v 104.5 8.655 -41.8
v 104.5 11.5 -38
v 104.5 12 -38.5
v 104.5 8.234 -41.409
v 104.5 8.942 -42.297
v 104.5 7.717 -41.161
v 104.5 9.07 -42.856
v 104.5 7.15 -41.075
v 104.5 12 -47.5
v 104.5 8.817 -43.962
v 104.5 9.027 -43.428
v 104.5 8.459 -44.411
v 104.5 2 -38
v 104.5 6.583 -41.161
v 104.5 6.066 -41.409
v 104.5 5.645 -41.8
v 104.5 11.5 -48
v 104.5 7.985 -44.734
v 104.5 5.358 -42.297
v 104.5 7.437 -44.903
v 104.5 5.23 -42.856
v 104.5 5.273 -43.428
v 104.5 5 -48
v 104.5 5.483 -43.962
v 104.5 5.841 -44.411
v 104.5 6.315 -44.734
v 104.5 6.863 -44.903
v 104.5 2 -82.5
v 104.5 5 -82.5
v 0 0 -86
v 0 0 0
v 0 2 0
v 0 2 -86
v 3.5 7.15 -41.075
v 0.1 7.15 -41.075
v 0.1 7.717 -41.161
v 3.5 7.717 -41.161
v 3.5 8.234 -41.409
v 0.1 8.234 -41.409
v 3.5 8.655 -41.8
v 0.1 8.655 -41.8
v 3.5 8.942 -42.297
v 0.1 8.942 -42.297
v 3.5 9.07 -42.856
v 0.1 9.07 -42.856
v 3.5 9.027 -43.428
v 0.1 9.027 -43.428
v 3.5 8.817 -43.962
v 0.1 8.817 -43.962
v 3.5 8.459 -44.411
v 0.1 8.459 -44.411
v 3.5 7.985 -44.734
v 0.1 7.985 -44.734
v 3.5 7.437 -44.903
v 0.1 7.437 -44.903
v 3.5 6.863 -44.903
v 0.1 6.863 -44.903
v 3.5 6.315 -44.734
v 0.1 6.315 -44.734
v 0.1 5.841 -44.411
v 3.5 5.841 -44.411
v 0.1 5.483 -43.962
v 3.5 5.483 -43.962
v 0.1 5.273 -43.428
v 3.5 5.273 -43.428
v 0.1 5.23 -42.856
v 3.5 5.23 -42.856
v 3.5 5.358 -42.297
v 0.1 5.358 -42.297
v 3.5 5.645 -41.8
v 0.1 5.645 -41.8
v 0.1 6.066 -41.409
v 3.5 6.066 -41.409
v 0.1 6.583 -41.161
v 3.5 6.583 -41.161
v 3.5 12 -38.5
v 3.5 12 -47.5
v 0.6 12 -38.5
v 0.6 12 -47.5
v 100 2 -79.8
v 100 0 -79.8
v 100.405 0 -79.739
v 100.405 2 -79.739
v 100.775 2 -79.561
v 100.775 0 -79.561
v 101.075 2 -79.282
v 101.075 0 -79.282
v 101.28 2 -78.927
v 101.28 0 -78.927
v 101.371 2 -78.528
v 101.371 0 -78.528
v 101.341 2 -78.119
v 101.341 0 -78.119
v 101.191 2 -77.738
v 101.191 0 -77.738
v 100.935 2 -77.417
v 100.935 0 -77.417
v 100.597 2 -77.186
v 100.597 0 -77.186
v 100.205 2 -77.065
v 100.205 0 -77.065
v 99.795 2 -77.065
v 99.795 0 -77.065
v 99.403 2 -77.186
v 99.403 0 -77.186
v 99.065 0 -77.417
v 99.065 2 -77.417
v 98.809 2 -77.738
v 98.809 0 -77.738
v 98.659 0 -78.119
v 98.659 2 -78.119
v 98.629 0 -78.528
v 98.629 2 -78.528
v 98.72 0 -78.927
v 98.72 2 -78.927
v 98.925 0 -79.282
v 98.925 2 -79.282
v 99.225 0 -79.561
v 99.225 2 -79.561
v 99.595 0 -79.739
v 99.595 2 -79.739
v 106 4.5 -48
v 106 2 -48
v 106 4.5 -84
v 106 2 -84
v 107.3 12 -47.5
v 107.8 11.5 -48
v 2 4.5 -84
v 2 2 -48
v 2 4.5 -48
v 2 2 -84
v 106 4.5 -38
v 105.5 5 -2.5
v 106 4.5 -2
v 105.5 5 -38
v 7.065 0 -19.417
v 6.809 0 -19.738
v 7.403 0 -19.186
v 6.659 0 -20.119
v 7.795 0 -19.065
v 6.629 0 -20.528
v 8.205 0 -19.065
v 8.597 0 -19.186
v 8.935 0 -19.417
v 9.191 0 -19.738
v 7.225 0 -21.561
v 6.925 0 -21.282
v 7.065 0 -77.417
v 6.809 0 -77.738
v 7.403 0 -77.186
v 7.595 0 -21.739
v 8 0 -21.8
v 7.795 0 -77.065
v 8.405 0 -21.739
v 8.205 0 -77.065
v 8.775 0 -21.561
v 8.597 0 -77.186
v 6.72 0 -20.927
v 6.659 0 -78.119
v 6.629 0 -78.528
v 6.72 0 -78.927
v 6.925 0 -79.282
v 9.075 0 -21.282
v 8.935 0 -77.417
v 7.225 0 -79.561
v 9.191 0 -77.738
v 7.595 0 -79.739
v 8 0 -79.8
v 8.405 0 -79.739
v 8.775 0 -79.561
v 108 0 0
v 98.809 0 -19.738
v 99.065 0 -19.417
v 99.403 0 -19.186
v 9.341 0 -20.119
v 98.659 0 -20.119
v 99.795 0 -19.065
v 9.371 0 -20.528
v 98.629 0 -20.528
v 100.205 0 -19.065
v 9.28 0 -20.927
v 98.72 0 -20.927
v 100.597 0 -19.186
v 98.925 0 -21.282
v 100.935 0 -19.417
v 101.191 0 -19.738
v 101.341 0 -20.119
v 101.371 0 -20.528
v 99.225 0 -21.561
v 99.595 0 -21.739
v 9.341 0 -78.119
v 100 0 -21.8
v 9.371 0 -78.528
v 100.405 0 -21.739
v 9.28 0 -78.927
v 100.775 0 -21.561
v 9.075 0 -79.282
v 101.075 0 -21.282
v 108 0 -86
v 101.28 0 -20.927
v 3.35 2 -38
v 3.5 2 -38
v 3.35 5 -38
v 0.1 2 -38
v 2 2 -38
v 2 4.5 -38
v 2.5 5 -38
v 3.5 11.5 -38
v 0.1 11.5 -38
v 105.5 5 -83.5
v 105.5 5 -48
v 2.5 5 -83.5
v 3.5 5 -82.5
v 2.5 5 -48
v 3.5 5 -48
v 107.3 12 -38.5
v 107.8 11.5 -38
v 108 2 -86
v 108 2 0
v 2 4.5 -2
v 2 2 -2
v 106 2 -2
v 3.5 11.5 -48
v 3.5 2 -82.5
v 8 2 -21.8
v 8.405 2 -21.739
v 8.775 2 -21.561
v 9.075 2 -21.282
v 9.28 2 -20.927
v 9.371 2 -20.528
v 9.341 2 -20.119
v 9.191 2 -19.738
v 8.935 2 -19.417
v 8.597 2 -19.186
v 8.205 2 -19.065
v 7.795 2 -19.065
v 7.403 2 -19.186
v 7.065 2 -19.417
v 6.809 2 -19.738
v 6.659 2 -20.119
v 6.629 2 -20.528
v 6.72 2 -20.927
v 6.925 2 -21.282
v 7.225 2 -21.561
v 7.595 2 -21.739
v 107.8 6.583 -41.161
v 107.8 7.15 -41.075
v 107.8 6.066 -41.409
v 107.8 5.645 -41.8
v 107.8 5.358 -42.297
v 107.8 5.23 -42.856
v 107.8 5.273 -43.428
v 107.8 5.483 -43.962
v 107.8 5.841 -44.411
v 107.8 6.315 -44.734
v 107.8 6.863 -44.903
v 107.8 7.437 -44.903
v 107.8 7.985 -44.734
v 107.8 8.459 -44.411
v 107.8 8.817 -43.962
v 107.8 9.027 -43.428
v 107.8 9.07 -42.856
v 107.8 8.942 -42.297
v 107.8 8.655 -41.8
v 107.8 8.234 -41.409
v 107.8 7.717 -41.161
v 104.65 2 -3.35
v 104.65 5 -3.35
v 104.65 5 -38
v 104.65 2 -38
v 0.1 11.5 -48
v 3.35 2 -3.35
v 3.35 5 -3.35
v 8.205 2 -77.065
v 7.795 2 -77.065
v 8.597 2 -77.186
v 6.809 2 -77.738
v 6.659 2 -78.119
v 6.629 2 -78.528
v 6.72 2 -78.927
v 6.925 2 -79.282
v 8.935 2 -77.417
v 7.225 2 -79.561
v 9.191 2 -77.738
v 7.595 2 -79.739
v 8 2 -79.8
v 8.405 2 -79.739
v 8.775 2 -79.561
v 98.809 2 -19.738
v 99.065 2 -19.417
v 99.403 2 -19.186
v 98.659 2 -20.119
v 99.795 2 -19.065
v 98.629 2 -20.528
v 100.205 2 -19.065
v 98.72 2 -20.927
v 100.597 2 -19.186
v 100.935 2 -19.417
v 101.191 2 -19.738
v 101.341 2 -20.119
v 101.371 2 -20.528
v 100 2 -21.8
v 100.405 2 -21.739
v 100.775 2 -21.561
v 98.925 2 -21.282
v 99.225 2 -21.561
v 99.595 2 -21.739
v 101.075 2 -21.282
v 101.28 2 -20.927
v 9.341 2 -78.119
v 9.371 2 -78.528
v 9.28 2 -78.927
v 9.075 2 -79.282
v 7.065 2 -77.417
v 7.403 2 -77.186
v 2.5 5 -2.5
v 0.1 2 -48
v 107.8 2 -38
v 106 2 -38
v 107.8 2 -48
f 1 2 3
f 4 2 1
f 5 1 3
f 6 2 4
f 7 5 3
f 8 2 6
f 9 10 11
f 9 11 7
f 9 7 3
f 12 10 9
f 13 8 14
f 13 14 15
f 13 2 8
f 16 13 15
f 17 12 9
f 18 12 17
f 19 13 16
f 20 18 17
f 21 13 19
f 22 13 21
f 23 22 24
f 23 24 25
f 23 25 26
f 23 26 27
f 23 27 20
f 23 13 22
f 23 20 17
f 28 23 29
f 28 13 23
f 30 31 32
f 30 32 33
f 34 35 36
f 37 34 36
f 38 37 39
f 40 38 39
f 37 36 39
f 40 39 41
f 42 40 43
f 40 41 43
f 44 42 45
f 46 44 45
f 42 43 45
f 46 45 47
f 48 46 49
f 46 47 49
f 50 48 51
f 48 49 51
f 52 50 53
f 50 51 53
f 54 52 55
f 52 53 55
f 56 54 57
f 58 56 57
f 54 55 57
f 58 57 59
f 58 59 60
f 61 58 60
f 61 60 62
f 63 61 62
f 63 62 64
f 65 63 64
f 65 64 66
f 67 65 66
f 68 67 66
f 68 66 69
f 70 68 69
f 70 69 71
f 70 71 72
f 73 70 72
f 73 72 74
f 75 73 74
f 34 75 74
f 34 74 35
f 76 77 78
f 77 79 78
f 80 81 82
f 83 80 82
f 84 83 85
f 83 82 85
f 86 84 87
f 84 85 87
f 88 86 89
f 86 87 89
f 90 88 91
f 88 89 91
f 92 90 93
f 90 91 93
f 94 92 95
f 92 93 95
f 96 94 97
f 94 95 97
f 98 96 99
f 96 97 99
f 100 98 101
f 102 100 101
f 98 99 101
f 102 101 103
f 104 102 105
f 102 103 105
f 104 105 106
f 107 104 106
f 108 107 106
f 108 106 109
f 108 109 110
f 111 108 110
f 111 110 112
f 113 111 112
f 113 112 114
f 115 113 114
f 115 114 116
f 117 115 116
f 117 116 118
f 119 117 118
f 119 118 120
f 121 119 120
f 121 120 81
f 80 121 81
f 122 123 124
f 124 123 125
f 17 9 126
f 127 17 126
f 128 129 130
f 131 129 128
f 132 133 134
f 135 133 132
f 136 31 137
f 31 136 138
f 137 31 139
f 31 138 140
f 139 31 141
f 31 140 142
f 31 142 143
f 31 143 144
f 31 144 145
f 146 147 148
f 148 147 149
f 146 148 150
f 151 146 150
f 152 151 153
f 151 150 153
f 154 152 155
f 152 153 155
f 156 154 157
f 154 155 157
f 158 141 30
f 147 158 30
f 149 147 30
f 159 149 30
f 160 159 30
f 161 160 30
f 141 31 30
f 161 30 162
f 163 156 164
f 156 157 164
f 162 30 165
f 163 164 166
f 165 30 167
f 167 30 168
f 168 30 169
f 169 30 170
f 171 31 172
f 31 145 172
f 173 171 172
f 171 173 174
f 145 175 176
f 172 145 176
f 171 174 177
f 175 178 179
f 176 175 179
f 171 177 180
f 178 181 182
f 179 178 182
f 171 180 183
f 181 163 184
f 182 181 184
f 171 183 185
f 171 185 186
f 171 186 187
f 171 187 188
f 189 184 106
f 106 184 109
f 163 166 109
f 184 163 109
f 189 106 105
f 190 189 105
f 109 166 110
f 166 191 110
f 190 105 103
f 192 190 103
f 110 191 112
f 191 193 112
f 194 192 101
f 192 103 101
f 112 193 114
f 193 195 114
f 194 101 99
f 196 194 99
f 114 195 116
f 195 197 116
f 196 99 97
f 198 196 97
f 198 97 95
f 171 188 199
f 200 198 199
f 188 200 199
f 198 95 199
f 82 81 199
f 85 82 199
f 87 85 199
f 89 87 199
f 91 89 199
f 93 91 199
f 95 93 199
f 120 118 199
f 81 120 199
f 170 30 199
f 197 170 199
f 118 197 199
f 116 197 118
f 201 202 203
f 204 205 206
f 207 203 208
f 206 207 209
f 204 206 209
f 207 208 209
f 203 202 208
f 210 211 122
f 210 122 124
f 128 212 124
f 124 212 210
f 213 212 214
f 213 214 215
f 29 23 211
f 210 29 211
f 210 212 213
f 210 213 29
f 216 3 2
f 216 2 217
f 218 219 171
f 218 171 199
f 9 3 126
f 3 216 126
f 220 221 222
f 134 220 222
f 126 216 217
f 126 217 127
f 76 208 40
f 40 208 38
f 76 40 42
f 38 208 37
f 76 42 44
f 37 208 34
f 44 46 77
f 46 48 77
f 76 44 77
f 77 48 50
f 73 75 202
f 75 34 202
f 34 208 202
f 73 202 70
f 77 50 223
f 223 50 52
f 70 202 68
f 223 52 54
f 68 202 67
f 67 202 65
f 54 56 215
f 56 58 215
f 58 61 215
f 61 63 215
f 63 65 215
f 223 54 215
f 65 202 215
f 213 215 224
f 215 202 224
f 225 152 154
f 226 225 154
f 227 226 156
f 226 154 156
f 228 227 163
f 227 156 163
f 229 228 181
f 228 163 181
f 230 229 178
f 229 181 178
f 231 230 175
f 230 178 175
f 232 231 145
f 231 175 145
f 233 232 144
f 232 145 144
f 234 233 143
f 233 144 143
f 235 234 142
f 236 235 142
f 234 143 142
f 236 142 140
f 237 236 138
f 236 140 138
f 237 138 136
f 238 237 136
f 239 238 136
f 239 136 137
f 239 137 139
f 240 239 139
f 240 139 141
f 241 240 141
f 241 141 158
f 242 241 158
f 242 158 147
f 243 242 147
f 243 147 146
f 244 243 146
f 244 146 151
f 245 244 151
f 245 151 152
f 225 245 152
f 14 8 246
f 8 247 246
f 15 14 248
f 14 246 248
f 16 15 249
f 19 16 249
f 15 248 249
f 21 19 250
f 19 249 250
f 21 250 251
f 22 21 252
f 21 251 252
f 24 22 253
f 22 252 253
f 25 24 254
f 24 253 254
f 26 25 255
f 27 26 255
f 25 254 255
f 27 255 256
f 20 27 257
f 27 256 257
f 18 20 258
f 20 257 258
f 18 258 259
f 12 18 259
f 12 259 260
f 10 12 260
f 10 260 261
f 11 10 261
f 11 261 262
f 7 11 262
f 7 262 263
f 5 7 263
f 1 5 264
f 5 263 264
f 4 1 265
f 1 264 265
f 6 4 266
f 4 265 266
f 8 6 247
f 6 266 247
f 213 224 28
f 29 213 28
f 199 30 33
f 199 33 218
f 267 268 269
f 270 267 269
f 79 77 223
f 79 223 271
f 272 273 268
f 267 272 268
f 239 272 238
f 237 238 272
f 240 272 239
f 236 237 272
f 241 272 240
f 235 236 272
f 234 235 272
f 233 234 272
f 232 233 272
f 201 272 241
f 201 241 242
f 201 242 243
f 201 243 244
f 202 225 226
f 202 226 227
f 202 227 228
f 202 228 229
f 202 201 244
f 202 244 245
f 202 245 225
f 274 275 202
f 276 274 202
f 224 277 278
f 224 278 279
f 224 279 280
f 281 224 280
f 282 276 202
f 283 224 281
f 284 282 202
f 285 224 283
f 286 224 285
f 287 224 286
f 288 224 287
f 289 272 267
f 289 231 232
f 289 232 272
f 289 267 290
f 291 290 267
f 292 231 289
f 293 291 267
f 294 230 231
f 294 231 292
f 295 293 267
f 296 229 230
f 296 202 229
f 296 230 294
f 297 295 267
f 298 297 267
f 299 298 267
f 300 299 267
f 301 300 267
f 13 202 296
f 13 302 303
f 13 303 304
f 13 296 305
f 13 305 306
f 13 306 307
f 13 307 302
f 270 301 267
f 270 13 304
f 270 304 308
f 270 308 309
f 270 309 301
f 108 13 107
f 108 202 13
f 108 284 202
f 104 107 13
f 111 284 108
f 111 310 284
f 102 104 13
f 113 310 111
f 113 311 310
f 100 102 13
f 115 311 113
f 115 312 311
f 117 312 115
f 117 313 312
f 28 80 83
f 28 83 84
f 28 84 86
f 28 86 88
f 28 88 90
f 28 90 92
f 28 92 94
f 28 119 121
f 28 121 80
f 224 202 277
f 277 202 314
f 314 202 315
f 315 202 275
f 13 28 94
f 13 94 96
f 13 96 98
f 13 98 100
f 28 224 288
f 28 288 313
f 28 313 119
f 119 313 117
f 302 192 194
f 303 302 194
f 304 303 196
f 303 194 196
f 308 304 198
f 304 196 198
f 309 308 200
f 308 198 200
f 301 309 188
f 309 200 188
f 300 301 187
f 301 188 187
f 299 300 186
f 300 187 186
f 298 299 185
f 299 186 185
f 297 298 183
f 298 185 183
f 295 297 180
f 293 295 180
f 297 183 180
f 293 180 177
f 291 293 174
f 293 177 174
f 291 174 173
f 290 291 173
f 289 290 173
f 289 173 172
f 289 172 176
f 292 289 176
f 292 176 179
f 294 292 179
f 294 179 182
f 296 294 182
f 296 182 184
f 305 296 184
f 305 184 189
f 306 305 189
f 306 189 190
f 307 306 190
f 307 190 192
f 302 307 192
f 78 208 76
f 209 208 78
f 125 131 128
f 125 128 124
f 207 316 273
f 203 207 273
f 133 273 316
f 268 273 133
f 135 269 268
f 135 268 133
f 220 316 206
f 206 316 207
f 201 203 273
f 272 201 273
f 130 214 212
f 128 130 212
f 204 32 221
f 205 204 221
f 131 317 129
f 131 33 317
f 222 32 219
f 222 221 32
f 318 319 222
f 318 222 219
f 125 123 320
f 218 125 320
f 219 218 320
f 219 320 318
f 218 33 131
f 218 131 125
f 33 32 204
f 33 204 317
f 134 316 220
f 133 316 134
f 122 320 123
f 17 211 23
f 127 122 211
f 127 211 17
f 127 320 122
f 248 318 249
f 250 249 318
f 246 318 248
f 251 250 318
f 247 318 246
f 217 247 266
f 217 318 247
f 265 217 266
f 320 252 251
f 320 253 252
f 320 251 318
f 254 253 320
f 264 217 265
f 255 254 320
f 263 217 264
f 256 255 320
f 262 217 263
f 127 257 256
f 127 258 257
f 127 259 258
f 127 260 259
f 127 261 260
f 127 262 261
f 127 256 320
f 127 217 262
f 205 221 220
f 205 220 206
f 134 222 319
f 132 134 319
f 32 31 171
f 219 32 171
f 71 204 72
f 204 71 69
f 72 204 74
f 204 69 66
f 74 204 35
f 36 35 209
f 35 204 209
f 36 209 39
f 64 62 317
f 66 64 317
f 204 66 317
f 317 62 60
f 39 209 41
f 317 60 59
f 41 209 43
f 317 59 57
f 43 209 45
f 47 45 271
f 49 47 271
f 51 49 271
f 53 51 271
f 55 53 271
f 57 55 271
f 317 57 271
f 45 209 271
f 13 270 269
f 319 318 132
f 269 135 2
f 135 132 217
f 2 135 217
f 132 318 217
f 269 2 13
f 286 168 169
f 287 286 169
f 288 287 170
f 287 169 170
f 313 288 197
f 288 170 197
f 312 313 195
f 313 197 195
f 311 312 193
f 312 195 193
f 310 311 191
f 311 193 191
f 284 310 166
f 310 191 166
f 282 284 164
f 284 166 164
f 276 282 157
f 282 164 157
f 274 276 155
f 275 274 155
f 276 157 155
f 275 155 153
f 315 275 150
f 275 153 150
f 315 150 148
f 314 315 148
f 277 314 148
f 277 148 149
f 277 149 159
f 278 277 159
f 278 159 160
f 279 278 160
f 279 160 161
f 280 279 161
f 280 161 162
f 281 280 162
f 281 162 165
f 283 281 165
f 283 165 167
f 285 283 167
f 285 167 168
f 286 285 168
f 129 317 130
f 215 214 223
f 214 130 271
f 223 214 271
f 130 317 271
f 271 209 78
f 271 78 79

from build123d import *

# Parameters (mm, degrees)
SKETCH1_W                       = 108
SKETCH1_H                       = 86
BOSS_EXTRUDE1_DEPTH             = 2
SKETCH2_W                       = 104
SKETCH2_H                       = 82
SKETCH2_W_2                     = 101
SKETCH2_H_2                     = 79
BOSS_EXTRUDE2_DEPTH             = 3
BOSS_EXTRUDE4_REACH             = 138.591
SKETCH5_W                       = 10
SKETCH5_H                       = 10
BOSS_EXTRUDE4_DIRECTION_2_REACH = 138.591
BOSS_EXTRUDE5_REACH             = 139.026
SKETCH6_W                       = 10
SKETCH6_H                       = 10
BOSS_EXTRUDE5_DIRECTION_2_REACH = 139.026
SKETCH11_W                      = 0.1
SKETCH11_H                      = 10
SKETCH11_W_2                    = 0.2
CUT_EXTRUDE2_DEPTH              = 10
CHAMFER1_SIZE                   = 0.5
CHAMFER2_SIZE                   = 0.5
CUT_EXTRUDE3_REACH              = 140.578
SKETCH12_R                      = 1.375
CUT_EXTRUDE5_DEPTH              = 3
CUT_EXTRUDE6_REACH              = 140.501
SKETCH14_R                      = 1.925
CUT_EXTRUDE7_REACH              = 140.423
SKETCH15_R                      = 1.925


with BuildPart() as part:
    # Sketch1 → Boss-Extrude1 (new body)
    with BuildSketch(Plane(origin=(0, 0, 0), x_dir=(1, 0, 0), z_dir=(0, 1, 0))):
        with Locations((54, 43)):
            Rectangle(SKETCH1_W, SKETCH1_H)
    extrude(amount=BOSS_EXTRUDE1_DEPTH)

    # Sketch2 → Boss-Extrude2 (add)
    with BuildSketch(Plane(origin=(0, 2, 0), x_dir=(1, 0, 0), z_dir=(0, 1, 0))):
        with Locations((54, 43)):
            Rectangle(SKETCH2_W, SKETCH2_H)
        with Locations((54, 43)):
            Rectangle(SKETCH2_W_2, SKETCH2_H_2, mode=Mode.SUBTRACT)
    extrude(amount=BOSS_EXTRUDE2_DEPTH)

    # Boss-Extrude4: up to this face of the body (flat: up to its plane)
    boss_extrude4_end = Plane(part.part.faces().sort_by_distance((0, 1, -43))[0])
    # Sketch5 → Boss-Extrude4 (add, up to the picked face)
    with BuildSketch(Plane.ZY.offset(-2), mode=Mode.PRIVATE) as boss_extrude4_sk1:
        with Locations((-43, 7)):
            Rectangle(SKETCH5_W, SKETCH5_H)
    boss_extrude4_tool1 = split(extrude(boss_extrude4_sk1.sketch, amount=BOSS_EXTRUDE4_REACH, mode=Mode.PRIVATE), bisect_by=boss_extrude4_end, keep=Keep.BOTH, mode=Mode.PRIVATE)
    add(boss_extrude4_tool1.solids().sort_by(Axis((2, 7, -43), (-1, 0, 0)))[0])

    # Boss-Extrude4 direction 2: up to this face of the body (flat: up to its plane)
    boss_extrude4_direction_2_end = Plane(part.part.faces().sort_by_distance((3.5, 3.5, -43))[0])
    # Sketch5 → Boss-Extrude4 direction 2 (add, up to the picked face)
    with BuildSketch(Plane.ZY.offset(-2), mode=Mode.PRIVATE) as boss_extrude4_direction_2_sk1:
        with Locations((-43, 7)):
            Rectangle(SKETCH5_W, SKETCH5_H)
    boss_extrude4_direction_2_tool1 = split(extrude(boss_extrude4_direction_2_sk1.sketch, amount=-BOSS_EXTRUDE4_DIRECTION_2_REACH, mode=Mode.PRIVATE), bisect_by=boss_extrude4_direction_2_end, keep=Keep.BOTH, mode=Mode.PRIVATE)
    add(boss_extrude4_direction_2_tool1.solids().sort_by(Axis((2, 7, -43), (1, 0, 0)))[0])

    # Boss-Extrude5: up to this face of the body (flat: up to its plane)
    boss_extrude5_end = Plane(part.part.faces().sort_by_distance((108, 1, -43))[0])
    # Sketch6 → Boss-Extrude5 (add, up to the picked face)
    with BuildSketch(Plane(origin=(106, 0, 0), x_dir=(0, 0, -1), z_dir=(1, 0, 0)), mode=Mode.PRIVATE) as boss_extrude5_sk1:
        with Locations((43, 7)):
            Rectangle(SKETCH6_W, SKETCH6_H)
    boss_extrude5_tool1 = split(extrude(boss_extrude5_sk1.sketch, amount=BOSS_EXTRUDE5_REACH, mode=Mode.PRIVATE), bisect_by=boss_extrude5_end, keep=Keep.BOTH, mode=Mode.PRIVATE)
    add(boss_extrude5_tool1.solids().sort_by(Axis((106, 7, -43), (1, 0, 0)))[0])

    # Boss-Extrude5 direction 2: up to this face of the body (flat: up to its plane)
    boss_extrude5_direction_2_end = Plane(part.part.faces().sort_by_distance((104.5, 3.5, -43))[0])
    # Sketch6 → Boss-Extrude5 direction 2 (add, up to the picked face)
    with BuildSketch(Plane(origin=(106, 0, 0), x_dir=(0, 0, -1), z_dir=(1, 0, 0)), mode=Mode.PRIVATE) as boss_extrude5_direction_2_sk1:
        with Locations((43, 7)):
            Rectangle(SKETCH6_W, SKETCH6_H)
    boss_extrude5_direction_2_tool1 = split(extrude(boss_extrude5_direction_2_sk1.sketch, amount=-BOSS_EXTRUDE5_DIRECTION_2_REACH, mode=Mode.PRIVATE), bisect_by=boss_extrude5_direction_2_end, keep=Keep.BOTH, mode=Mode.PRIVATE)
    add(boss_extrude5_direction_2_tool1.solids().sort_by(Axis((106, 7, -43), (-1, 0, 0)))[0])

    # Sketch11 → Cut-Extrude2 (cut)
    with BuildSketch(Plane(origin=(0, 12, 0), x_dir=(1, 0, 0), z_dir=(0, 1, 0))):
        with Locations((0.05, 43)):
            Rectangle(SKETCH11_W, SKETCH11_H)
        with Locations((107.9, 43)):
            Rectangle(SKETCH11_W_2, SKETCH11_H)
    extrude(amount=-CUT_EXTRUDE2_DEPTH, mode=Mode.SUBTRACT)

    # Chamfer1
    chamfer1_edges = [part.edges().sort_by_distance(p)[0] for p in [
        (54, 5, -84),
        (2, 5, -66),
        (54, 5, -2),
        (106, 5, -20),
        (2, 5, -20),
        (106, 5, -66),
    ]]
    chamfer(chamfer1_edges, length=CHAMFER1_SIZE)

    # Chamfer2
    chamfer2_edges = [part.edges().sort_by_distance(p)[0] for p in [
        (106.15, 12, -38),
        (106.15, 12, -48),
        (1.8, 12, -48),
        (1.8, 12, -38),
        (0.1, 12, -43),
        (107.8, 12, -43),
    ]]
    chamfer(chamfer2_edges, length=CHAMFER2_SIZE)

    # Sketch12 → Cut-Extrude3 (cut, up to next)
    with BuildSketch(Plane.XZ, mode=Mode.PRIVATE) as cut_extrude3_sk1:
        with Locations(Location((100, -78.425, 0), (0, 0, 270))):
            Circle(SKETCH12_R)
    cut_extrude3_tool1 = extrude(cut_extrude3_sk1.sketch, amount=-CUT_EXTRUDE3_REACH, mode=Mode.PRIVATE) & part.part
    # Sketch12 → Cut-Extrude3 (cut, up to next)
    with BuildSketch(Plane.XZ, mode=Mode.PRIVATE) as cut_extrude3_sk2:
        with Locations(Location((8, -78.425, 0), (0, 0, 270))):
            Circle(SKETCH12_R)
    cut_extrude3_tool2 = extrude(cut_extrude3_sk2.sketch, amount=-CUT_EXTRUDE3_REACH, mode=Mode.PRIVATE) & part.part
    # Sketch12 → Cut-Extrude3 (cut, up to next)
    with BuildSketch(Plane.XZ, mode=Mode.PRIVATE) as cut_extrude3_sk3:
        with Locations(Location((8, -20.425, 0), (0, 0, 270))):
            Circle(SKETCH12_R)
    cut_extrude3_tool3 = extrude(cut_extrude3_sk3.sketch, amount=-CUT_EXTRUDE3_REACH, mode=Mode.PRIVATE) & part.part
    # Sketch12 → Cut-Extrude3 (cut, up to next)
    with BuildSketch(Plane.XZ, mode=Mode.PRIVATE) as cut_extrude3_sk4:
        with Locations(Location((100, -20.425, 0), (0, 0, 270))):
            Circle(SKETCH12_R)
    cut_extrude3_tool4 = extrude(cut_extrude3_sk4.sketch, amount=-CUT_EXTRUDE3_REACH, mode=Mode.PRIVATE) & part.part
    add(cut_extrude3_tool1.solids().sort_by_distance((100, 0, -78.425))[0], mode=Mode.SUBTRACT)
    add(cut_extrude3_tool2.solids().sort_by_distance((8, 0, -78.425))[0], mode=Mode.SUBTRACT)
    add(cut_extrude3_tool3.solids().sort_by_distance((8, 0, -20.425))[0], mode=Mode.SUBTRACT)
    add(cut_extrude3_tool4.solids().sort_by_distance((100, 0, -20.425))[0], mode=Mode.SUBTRACT)

    # Sketch13 → Cut-Extrude5 (cut)
    with BuildSketch(Plane(origin=(0, 5, 0), x_dir=(1, 0, 0), z_dir=(0, 1, 0))):
        Polygon((3.35, 38), (3.35, 3.35), (104.65, 3.35), (104.65, 38), (104.5, 38), (104.5, 3.5), (3.5, 3.5), (3.5, 38), align=None)
    extrude(amount=-CUT_EXTRUDE5_DEPTH, mode=Mode.SUBTRACT)

    # Sketch14 → Cut-Extrude6 (cut, up to next)
    with BuildSketch(Plane.ZY.offset(-0.1), mode=Mode.PRIVATE) as cut_extrude6_sk1:
        with Locations((-43, 7.15)):
            Circle(SKETCH14_R)
    cut_extrude6_tool1 = extrude(cut_extrude6_sk1.sketch, amount=-CUT_EXTRUDE6_REACH, mode=Mode.PRIVATE) & part.part
    add(cut_extrude6_tool1.solids().sort_by_distance((0.1, 7.15, -43))[0], mode=Mode.SUBTRACT)

    # Sketch15 → Cut-Extrude7 (cut, up to next)
    with BuildSketch(Plane(origin=(107.8, 0, 0), x_dir=(0, 0, -1), z_dir=(1, 0, 0)), mode=Mode.PRIVATE) as cut_extrude7_sk1:
        with Locations(Location((43, 7.15, 0), (0, 0, 180))):
            Circle(SKETCH15_R)
    cut_extrude7_tool1 = extrude(cut_extrude7_sk1.sketch, amount=-CUT_EXTRUDE7_REACH, mode=Mode.PRIVATE) & part.part
    add(cut_extrude7_tool1.solids().sort_by_distance((107.8, 7.15, -43))[0], mode=Mode.SUBTRACT)


solid = part.part
